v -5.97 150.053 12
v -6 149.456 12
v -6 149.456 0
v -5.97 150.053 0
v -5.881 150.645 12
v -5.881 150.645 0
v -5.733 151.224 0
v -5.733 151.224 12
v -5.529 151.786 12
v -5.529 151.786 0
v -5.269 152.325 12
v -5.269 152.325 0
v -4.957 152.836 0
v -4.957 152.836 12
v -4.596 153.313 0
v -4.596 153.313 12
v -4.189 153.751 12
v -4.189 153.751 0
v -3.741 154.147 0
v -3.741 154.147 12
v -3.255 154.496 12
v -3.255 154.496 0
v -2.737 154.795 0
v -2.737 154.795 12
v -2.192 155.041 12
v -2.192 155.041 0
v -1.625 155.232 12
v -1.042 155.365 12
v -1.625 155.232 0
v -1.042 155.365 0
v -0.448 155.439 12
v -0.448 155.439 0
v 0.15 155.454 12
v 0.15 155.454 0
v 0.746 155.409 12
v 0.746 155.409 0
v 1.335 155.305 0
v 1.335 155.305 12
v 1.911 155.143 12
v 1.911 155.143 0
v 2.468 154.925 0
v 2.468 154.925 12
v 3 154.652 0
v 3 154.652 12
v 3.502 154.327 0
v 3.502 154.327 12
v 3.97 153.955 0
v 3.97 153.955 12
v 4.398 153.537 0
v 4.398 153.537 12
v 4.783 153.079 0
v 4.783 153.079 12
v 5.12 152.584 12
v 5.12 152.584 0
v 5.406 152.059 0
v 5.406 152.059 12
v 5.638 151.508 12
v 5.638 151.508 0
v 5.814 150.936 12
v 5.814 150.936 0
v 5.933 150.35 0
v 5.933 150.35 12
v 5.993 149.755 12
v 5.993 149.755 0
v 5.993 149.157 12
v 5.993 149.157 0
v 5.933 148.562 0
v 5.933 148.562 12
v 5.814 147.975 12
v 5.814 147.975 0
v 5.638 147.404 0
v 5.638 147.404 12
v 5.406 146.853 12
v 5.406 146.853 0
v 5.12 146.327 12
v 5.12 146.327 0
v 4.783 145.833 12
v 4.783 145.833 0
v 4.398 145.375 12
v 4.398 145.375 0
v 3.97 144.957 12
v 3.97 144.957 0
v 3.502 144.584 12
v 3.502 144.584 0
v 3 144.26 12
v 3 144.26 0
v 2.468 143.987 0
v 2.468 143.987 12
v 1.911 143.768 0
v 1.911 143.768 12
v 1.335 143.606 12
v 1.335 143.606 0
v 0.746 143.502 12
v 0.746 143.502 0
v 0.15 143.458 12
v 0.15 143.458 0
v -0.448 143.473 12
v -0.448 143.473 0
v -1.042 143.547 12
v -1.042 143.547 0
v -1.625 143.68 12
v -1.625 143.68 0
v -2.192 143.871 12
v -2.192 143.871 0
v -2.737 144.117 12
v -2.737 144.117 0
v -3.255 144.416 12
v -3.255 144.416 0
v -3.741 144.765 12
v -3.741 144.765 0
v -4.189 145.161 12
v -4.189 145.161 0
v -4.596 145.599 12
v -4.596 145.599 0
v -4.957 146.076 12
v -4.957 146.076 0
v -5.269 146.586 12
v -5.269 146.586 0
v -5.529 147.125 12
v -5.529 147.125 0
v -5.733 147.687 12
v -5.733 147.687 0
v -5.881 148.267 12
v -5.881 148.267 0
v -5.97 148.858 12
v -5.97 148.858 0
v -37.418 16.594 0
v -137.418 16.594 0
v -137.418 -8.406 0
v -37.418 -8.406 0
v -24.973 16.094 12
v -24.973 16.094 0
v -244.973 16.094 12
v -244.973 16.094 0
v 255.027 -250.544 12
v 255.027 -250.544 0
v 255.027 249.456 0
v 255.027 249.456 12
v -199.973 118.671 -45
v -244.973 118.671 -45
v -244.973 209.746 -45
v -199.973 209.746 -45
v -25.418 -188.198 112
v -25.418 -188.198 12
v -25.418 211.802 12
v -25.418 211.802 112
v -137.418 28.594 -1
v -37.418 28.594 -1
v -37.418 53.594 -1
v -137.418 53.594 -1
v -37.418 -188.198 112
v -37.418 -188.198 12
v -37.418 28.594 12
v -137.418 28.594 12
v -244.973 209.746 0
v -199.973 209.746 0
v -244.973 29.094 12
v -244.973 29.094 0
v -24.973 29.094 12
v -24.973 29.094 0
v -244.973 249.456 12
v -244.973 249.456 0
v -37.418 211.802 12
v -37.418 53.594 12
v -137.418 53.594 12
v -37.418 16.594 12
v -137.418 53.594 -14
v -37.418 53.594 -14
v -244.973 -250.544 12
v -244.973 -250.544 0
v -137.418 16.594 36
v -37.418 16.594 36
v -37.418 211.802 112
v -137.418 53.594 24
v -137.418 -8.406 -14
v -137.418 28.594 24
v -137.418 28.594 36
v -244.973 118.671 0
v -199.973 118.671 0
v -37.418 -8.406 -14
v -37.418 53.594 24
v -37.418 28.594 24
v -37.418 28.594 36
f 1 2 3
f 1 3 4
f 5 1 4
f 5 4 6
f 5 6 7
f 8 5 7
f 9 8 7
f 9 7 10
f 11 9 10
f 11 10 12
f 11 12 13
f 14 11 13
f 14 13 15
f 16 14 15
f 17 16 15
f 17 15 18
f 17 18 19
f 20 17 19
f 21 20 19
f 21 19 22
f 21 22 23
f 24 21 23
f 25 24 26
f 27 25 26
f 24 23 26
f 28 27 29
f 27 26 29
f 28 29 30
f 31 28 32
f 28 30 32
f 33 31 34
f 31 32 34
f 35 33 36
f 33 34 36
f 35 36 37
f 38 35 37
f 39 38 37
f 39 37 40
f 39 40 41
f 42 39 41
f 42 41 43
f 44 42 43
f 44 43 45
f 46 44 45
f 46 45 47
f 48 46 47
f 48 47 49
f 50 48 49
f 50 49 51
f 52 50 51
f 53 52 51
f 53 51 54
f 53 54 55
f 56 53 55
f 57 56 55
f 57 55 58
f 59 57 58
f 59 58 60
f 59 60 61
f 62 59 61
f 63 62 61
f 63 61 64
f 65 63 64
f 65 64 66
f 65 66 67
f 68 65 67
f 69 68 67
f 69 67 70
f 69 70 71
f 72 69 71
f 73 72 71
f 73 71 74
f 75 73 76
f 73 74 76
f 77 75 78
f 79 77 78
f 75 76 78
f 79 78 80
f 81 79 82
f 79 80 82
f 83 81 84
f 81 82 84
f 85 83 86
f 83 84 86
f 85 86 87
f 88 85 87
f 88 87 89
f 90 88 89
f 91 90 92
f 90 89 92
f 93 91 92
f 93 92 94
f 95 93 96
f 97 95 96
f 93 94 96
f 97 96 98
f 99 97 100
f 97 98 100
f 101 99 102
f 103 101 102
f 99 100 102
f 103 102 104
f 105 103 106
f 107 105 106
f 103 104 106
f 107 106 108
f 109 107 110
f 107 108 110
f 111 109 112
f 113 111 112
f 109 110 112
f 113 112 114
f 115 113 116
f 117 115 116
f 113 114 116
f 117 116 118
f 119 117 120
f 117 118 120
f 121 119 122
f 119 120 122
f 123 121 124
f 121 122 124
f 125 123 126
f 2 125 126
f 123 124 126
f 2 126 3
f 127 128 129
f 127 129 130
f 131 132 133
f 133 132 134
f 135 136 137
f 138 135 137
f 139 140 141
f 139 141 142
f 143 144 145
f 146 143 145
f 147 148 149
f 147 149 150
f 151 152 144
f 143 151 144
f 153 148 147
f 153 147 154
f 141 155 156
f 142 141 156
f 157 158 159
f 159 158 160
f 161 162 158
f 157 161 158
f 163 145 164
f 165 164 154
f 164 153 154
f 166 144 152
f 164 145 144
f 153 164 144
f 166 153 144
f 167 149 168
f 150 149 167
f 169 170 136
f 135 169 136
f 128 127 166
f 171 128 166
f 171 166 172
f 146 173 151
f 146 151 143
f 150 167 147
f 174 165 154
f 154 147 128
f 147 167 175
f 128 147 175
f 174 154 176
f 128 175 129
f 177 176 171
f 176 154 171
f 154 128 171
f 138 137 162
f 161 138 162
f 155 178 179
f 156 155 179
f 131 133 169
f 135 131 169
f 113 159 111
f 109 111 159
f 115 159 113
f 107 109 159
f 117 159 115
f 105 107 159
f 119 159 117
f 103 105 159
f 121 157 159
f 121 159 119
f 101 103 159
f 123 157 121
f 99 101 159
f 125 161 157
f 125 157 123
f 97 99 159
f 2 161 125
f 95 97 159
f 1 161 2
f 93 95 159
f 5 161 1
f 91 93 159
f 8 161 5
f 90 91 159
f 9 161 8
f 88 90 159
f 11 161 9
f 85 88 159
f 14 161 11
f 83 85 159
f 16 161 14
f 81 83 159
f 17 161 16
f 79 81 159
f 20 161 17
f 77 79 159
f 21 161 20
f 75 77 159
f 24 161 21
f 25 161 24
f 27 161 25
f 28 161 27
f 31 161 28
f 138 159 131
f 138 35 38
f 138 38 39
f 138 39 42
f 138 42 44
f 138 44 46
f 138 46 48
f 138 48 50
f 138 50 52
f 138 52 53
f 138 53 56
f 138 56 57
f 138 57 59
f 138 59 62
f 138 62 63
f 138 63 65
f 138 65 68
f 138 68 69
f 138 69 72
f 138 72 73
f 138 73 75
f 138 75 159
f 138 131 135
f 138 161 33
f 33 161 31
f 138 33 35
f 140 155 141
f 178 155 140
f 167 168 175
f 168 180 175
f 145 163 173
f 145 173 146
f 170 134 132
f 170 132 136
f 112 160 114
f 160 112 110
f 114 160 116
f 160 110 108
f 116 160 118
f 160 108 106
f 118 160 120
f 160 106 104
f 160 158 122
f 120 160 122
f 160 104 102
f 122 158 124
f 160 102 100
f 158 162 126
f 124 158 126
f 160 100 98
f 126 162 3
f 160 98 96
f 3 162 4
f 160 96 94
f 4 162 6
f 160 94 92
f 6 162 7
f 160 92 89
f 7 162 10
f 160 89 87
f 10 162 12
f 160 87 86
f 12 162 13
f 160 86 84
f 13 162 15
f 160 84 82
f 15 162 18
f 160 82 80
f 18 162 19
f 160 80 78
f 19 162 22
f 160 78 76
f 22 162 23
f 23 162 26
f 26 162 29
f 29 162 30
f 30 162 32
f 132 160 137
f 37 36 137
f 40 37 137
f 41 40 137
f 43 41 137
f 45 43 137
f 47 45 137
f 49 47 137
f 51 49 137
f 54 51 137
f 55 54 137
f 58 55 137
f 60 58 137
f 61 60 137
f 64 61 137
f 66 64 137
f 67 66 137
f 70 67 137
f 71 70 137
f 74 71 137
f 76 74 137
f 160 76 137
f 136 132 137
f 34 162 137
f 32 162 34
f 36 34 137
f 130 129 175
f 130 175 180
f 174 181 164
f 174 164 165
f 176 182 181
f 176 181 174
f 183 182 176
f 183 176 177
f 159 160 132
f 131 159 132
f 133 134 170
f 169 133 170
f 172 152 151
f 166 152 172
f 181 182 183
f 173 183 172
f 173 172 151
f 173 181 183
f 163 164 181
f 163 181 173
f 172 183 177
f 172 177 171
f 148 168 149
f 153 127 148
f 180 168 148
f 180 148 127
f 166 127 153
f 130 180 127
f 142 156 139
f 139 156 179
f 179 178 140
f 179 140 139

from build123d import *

# Parameters (mm, degrees)
F1_DEPTH  = 12
F3_D      = 12
F4_W      = 12
F4_H      = 400
F5_DEPTH  = 100
F6_W      = 12
F6_H      = 50
F7_DEPTH  = 100
F8_W      = 100
F8_H      = 14
F9_DEPTH  = 25
F10_W     = 100
F10_H     = 13
F11_DEPTH = 25
F12_W     = 100
F12_H     = 12
F13_DEPTH = 25
F14_W     = 45
F14_H     = 91.0748828953
F15_DEPTH = 45


with BuildPart() as f1:
    # F0 (on Top) → F1 (new body)
    with BuildSketch(Plane.XY):
        Polygon((255.0269067287, 249.4558691978), (-244.9730932713, 249.4558691978), (-244.9730932713, 29.0937830806), (-24.9730932713, 29.0937830806), (-24.9730932713, 16.0937830806), (-244.9730932713, 16.0937830806), (-244.9730932713, -250.5441308022), (255.0269067287, -250.5441308022), align=None)
    extrude(amount=F1_DEPTH)

    # F3 (through all)
    with Locations(Plane.XY.offset(12)):
        with Locations((0, 149.4558691978)):
            Hole(F3_D / 2)


with BuildPart() as f5:
    # F4 (on face) → F5 (new body)
    with BuildSketch(Plane.XY.offset(12)):
        with Locations((-31.4178401083, 11.8017673492)):
            Rectangle(F4_W, F4_H)
    extrude(amount=F5_DEPTH)

    # F6 (on face) → F7 (join)
    with BuildSketch(Plane(origin=(-37.4178401083, 0, 0), x_dir=(0, -1, 0), z_dir=(-1, 0, 0))):
        with Locations((-22.5937830806, 11)):
            Rectangle(F6_W, F6_H)
    extrude(amount=F7_DEPTH)

    # F8 (on face) → F9 (join)
    with BuildSketch(Plane.XZ.offset(-16.5937830806)):
        with Locations((-87.4178401083, -7)):
            Rectangle(F8_W, F8_H)
    extrude(amount=F9_DEPTH)

    # F10 (on face) → F11 (join)
    with BuildSketch(Plane(origin=(0, 28.5937830806, 0), x_dir=(-1, 0, 0), z_dir=(0, 1, 0))):
        with Locations((87.4178401083, -7.5)):
            Rectangle(F10_W, F10_H)
    extrude(amount=F11_DEPTH)

    # F12 (on face) → F13 (join)
    with BuildSketch(Plane(origin=(0, 28.5937830806, 0), x_dir=(-1, 0, 0), z_dir=(0, 1, 0))):
        with Locations((87.4178401083, 18)):
            Rectangle(F12_W, F12_H)
    extrude(amount=F13_DEPTH)


with BuildPart() as f15:
    # F14 (on face) → F15 (new body)
    with BuildSketch(Plane(origin=(0, 0, 0), x_dir=(1, 0, 0), z_dir=(0, 0, -1))):
        with Locations((-222.4730932713, -164.2085915056)):
            Rectangle(F14_W, F14_H)
    extrude(amount=F15_DEPTH)


solid = Compound([f1.part, f5.part, f15.part])
